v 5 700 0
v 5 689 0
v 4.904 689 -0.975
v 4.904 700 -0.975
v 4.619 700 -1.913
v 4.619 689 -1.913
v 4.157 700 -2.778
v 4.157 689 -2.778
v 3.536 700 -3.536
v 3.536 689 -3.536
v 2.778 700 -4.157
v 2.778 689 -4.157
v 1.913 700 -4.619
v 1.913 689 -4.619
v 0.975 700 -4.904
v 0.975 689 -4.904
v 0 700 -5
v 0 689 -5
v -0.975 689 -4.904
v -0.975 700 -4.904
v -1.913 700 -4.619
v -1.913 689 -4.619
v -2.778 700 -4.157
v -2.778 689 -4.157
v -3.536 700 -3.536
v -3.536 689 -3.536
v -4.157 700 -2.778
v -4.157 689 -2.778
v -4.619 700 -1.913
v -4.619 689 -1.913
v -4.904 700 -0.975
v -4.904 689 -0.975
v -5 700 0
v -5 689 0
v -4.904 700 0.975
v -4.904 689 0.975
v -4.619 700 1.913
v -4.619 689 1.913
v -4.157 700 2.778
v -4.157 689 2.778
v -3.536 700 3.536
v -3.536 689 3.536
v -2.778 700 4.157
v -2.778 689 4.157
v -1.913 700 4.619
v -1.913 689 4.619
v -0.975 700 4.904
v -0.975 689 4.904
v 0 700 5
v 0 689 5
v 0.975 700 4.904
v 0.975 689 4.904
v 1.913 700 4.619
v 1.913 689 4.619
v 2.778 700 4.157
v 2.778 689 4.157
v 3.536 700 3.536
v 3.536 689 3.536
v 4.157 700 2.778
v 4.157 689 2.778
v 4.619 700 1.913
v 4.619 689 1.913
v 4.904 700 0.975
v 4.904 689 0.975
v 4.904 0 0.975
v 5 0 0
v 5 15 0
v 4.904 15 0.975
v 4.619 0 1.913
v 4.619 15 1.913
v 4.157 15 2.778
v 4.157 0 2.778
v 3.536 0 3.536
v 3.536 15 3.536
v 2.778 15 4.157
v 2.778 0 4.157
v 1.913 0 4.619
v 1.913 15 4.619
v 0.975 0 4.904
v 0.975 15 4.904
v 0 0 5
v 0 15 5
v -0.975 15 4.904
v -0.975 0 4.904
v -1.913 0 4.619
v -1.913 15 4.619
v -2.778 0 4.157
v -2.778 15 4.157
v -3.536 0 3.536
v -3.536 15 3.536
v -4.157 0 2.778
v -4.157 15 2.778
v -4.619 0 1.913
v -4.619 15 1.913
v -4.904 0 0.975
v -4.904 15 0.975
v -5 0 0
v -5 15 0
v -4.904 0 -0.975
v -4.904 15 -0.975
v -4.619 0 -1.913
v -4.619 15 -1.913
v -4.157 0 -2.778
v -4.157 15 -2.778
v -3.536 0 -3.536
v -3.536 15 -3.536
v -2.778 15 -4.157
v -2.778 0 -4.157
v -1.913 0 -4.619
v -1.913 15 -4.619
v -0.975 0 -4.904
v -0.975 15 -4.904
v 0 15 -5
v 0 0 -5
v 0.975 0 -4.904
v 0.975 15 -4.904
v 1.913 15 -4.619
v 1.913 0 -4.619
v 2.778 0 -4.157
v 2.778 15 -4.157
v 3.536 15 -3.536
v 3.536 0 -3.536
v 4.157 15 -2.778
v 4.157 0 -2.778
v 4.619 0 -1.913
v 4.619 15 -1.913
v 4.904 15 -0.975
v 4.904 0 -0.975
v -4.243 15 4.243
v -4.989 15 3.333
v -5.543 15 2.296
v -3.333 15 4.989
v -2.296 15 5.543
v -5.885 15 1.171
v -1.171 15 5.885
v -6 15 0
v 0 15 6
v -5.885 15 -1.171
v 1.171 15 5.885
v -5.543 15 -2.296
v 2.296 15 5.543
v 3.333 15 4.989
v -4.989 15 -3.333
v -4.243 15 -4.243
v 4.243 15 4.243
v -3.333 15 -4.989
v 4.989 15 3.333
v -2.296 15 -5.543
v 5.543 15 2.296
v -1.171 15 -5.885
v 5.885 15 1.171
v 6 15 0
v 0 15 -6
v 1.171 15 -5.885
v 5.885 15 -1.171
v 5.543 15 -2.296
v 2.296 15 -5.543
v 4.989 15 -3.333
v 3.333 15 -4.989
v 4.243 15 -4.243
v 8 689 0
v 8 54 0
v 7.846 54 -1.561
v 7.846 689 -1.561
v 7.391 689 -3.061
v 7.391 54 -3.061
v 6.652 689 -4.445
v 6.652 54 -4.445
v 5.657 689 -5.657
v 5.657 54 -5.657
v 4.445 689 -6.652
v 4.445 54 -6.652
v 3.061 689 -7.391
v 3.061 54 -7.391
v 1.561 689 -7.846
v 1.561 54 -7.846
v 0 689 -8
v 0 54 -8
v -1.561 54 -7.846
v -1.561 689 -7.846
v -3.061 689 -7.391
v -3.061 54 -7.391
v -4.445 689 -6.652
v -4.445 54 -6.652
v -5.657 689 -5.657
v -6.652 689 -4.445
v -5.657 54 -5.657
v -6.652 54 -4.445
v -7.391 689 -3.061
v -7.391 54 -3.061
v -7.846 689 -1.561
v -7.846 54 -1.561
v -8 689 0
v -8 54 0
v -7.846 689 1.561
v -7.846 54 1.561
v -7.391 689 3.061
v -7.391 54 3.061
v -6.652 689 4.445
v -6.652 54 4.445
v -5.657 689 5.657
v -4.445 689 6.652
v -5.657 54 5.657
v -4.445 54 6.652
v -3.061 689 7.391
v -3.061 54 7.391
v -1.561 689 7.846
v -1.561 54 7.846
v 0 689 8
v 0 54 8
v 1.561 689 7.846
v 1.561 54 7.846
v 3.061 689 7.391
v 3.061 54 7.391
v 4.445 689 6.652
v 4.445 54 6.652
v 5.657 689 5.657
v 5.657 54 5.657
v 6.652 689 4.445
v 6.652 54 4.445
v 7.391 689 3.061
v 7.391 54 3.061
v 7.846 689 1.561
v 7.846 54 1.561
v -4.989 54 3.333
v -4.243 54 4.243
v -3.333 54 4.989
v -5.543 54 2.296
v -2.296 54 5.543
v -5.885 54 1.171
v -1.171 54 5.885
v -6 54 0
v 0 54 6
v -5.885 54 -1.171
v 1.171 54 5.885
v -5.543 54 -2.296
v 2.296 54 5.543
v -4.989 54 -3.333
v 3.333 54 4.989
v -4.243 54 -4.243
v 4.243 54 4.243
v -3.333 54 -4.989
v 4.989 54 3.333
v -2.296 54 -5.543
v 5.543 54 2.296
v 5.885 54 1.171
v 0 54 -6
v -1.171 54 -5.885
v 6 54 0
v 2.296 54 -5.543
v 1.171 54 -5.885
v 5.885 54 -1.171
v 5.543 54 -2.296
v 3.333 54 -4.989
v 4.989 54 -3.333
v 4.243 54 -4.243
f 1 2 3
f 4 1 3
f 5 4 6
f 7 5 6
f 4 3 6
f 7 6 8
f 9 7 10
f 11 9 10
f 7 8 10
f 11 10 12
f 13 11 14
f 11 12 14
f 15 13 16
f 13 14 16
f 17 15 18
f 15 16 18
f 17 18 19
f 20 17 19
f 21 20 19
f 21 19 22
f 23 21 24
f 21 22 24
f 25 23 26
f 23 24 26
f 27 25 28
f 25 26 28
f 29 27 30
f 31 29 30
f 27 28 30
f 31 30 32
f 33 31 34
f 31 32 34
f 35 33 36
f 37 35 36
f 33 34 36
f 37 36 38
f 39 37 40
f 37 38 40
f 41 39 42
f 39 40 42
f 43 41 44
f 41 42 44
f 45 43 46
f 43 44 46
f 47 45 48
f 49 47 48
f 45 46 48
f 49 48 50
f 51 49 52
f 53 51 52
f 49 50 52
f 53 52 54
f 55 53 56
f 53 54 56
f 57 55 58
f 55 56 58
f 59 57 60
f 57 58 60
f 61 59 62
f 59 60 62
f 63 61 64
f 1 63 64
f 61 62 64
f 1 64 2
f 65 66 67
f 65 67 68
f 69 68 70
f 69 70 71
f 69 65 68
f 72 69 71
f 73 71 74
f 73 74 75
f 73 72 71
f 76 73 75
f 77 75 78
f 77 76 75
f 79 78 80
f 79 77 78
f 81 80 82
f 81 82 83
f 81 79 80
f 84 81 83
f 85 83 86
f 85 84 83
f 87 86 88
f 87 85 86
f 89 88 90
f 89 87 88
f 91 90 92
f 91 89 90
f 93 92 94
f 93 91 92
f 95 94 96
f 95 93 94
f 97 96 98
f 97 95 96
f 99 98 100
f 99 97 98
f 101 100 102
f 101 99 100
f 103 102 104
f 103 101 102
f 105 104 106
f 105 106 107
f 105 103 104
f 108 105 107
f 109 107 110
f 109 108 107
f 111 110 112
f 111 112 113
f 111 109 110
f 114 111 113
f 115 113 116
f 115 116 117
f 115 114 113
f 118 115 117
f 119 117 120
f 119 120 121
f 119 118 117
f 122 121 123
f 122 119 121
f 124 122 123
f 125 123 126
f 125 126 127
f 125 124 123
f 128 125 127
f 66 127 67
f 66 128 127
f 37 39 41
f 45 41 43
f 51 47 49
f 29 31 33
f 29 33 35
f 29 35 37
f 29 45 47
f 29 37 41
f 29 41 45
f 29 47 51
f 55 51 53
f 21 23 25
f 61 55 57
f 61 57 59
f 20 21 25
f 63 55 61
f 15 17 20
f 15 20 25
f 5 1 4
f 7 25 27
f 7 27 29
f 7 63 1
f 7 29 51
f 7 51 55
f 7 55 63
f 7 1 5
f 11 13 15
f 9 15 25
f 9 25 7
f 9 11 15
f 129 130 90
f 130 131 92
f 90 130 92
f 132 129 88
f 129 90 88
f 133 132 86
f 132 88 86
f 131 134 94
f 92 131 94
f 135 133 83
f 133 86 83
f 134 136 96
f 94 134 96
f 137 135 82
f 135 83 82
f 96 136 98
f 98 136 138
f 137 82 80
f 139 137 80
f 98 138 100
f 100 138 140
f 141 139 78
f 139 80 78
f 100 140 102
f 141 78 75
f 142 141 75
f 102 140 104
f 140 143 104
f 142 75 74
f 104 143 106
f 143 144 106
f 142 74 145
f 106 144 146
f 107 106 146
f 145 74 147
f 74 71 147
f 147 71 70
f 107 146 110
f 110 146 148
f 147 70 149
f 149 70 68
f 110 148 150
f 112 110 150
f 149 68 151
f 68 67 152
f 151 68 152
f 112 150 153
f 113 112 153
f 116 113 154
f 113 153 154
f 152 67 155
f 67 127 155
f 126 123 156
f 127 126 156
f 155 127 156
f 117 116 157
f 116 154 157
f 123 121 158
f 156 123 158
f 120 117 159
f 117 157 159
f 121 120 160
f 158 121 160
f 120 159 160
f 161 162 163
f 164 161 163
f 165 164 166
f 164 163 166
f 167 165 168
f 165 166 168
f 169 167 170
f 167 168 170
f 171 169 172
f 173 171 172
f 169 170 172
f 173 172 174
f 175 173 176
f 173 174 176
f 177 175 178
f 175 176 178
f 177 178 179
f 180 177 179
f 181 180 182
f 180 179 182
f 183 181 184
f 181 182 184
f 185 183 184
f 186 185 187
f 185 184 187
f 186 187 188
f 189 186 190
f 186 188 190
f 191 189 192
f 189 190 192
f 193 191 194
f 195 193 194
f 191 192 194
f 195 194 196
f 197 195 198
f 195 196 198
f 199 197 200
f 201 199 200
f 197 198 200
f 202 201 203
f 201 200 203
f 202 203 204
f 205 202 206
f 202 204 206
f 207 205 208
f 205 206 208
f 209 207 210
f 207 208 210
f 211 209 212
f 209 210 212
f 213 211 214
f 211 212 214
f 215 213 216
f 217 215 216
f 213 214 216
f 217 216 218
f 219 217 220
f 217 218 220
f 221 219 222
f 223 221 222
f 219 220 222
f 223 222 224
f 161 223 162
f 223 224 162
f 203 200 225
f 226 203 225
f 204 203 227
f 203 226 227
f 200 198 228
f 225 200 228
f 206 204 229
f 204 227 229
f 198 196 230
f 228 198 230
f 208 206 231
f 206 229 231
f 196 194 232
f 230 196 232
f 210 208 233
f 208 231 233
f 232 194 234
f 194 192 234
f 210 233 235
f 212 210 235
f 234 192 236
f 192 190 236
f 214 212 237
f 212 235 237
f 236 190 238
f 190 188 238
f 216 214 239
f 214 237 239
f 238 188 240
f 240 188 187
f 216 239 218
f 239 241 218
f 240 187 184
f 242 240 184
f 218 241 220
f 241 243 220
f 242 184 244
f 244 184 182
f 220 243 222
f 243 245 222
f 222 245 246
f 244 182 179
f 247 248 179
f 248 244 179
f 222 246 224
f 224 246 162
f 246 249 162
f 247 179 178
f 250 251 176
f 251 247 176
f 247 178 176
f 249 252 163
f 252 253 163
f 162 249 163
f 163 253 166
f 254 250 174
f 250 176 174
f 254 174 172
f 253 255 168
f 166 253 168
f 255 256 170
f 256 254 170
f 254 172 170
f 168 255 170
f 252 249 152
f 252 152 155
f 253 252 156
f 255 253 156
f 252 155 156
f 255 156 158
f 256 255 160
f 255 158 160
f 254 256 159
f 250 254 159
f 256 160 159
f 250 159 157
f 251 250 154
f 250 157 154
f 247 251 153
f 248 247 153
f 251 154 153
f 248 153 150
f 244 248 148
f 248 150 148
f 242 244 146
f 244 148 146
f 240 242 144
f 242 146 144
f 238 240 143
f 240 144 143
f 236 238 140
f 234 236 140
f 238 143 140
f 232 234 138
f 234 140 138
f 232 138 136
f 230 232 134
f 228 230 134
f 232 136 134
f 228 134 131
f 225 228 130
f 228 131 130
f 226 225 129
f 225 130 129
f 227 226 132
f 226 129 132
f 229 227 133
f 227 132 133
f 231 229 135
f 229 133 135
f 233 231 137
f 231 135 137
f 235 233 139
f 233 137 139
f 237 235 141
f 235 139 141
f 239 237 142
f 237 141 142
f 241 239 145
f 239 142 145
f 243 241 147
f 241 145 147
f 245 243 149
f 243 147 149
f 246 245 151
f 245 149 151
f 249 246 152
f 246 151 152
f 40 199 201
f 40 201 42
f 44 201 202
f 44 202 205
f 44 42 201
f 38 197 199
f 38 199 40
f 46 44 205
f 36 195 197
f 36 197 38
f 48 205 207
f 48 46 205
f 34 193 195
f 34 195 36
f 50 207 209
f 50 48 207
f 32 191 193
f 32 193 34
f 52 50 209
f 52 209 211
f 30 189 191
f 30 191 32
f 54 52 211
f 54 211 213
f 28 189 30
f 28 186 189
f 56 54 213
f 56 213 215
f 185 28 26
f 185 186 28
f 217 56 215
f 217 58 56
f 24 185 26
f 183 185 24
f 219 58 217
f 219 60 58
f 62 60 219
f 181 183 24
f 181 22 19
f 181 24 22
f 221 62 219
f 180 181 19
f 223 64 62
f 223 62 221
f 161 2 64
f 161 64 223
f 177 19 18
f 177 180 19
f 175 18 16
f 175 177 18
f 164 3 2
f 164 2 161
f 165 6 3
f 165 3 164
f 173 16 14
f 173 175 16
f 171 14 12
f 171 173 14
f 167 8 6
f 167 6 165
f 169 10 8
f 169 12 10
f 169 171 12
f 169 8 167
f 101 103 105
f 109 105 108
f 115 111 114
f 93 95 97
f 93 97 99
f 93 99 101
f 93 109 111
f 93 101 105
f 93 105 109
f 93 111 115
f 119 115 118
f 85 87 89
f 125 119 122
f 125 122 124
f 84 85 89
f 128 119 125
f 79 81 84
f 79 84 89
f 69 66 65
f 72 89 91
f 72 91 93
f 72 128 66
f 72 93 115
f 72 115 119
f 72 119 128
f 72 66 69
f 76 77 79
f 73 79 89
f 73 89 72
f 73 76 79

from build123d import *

# Parameters (mm, degrees)
SKETCH_R     = 5
PAD_DEPTH    = 15
SKETCH001_R  = 6
PAD001_DEPTH = 39
SKETCH002_R  = 8
PAD002_DEPTH = 635
SKETCH003_R  = 5
PAD003_DEPTH = 11


with BuildPart() as part:
    # Sketch → Pad (new body)
    with BuildSketch(Plane.XZ):
        Circle(SKETCH_R)
    extrude(amount=-PAD_DEPTH)

    # Sketch001 (on Face3 of Pad) → Pad001 (join)
    with BuildSketch(Plane(origin=(0, 15, 0), x_dir=(1, 0, 0), z_dir=(0, 1, 0))):
        Circle(SKETCH001_R)
    extrude(amount=PAD001_DEPTH)

    # Sketch002 (on Face3 of Pad001) → Pad002 (join)
    with BuildSketch(Plane(origin=(0, 54, 0), x_dir=(1, 0, 0), z_dir=(0, 1, 0))):
        Circle(SKETCH002_R)
    extrude(amount=PAD002_DEPTH)

    # Sketch003 (on Face3 of Pad002) → Pad003 (join)
    with BuildSketch(Plane(origin=(0, 689, 0), x_dir=(1, 0, 0), z_dir=(0, 1, 0))):
        Circle(SKETCH003_R)
    extrude(amount=PAD003_DEPTH)


solid = part.part
